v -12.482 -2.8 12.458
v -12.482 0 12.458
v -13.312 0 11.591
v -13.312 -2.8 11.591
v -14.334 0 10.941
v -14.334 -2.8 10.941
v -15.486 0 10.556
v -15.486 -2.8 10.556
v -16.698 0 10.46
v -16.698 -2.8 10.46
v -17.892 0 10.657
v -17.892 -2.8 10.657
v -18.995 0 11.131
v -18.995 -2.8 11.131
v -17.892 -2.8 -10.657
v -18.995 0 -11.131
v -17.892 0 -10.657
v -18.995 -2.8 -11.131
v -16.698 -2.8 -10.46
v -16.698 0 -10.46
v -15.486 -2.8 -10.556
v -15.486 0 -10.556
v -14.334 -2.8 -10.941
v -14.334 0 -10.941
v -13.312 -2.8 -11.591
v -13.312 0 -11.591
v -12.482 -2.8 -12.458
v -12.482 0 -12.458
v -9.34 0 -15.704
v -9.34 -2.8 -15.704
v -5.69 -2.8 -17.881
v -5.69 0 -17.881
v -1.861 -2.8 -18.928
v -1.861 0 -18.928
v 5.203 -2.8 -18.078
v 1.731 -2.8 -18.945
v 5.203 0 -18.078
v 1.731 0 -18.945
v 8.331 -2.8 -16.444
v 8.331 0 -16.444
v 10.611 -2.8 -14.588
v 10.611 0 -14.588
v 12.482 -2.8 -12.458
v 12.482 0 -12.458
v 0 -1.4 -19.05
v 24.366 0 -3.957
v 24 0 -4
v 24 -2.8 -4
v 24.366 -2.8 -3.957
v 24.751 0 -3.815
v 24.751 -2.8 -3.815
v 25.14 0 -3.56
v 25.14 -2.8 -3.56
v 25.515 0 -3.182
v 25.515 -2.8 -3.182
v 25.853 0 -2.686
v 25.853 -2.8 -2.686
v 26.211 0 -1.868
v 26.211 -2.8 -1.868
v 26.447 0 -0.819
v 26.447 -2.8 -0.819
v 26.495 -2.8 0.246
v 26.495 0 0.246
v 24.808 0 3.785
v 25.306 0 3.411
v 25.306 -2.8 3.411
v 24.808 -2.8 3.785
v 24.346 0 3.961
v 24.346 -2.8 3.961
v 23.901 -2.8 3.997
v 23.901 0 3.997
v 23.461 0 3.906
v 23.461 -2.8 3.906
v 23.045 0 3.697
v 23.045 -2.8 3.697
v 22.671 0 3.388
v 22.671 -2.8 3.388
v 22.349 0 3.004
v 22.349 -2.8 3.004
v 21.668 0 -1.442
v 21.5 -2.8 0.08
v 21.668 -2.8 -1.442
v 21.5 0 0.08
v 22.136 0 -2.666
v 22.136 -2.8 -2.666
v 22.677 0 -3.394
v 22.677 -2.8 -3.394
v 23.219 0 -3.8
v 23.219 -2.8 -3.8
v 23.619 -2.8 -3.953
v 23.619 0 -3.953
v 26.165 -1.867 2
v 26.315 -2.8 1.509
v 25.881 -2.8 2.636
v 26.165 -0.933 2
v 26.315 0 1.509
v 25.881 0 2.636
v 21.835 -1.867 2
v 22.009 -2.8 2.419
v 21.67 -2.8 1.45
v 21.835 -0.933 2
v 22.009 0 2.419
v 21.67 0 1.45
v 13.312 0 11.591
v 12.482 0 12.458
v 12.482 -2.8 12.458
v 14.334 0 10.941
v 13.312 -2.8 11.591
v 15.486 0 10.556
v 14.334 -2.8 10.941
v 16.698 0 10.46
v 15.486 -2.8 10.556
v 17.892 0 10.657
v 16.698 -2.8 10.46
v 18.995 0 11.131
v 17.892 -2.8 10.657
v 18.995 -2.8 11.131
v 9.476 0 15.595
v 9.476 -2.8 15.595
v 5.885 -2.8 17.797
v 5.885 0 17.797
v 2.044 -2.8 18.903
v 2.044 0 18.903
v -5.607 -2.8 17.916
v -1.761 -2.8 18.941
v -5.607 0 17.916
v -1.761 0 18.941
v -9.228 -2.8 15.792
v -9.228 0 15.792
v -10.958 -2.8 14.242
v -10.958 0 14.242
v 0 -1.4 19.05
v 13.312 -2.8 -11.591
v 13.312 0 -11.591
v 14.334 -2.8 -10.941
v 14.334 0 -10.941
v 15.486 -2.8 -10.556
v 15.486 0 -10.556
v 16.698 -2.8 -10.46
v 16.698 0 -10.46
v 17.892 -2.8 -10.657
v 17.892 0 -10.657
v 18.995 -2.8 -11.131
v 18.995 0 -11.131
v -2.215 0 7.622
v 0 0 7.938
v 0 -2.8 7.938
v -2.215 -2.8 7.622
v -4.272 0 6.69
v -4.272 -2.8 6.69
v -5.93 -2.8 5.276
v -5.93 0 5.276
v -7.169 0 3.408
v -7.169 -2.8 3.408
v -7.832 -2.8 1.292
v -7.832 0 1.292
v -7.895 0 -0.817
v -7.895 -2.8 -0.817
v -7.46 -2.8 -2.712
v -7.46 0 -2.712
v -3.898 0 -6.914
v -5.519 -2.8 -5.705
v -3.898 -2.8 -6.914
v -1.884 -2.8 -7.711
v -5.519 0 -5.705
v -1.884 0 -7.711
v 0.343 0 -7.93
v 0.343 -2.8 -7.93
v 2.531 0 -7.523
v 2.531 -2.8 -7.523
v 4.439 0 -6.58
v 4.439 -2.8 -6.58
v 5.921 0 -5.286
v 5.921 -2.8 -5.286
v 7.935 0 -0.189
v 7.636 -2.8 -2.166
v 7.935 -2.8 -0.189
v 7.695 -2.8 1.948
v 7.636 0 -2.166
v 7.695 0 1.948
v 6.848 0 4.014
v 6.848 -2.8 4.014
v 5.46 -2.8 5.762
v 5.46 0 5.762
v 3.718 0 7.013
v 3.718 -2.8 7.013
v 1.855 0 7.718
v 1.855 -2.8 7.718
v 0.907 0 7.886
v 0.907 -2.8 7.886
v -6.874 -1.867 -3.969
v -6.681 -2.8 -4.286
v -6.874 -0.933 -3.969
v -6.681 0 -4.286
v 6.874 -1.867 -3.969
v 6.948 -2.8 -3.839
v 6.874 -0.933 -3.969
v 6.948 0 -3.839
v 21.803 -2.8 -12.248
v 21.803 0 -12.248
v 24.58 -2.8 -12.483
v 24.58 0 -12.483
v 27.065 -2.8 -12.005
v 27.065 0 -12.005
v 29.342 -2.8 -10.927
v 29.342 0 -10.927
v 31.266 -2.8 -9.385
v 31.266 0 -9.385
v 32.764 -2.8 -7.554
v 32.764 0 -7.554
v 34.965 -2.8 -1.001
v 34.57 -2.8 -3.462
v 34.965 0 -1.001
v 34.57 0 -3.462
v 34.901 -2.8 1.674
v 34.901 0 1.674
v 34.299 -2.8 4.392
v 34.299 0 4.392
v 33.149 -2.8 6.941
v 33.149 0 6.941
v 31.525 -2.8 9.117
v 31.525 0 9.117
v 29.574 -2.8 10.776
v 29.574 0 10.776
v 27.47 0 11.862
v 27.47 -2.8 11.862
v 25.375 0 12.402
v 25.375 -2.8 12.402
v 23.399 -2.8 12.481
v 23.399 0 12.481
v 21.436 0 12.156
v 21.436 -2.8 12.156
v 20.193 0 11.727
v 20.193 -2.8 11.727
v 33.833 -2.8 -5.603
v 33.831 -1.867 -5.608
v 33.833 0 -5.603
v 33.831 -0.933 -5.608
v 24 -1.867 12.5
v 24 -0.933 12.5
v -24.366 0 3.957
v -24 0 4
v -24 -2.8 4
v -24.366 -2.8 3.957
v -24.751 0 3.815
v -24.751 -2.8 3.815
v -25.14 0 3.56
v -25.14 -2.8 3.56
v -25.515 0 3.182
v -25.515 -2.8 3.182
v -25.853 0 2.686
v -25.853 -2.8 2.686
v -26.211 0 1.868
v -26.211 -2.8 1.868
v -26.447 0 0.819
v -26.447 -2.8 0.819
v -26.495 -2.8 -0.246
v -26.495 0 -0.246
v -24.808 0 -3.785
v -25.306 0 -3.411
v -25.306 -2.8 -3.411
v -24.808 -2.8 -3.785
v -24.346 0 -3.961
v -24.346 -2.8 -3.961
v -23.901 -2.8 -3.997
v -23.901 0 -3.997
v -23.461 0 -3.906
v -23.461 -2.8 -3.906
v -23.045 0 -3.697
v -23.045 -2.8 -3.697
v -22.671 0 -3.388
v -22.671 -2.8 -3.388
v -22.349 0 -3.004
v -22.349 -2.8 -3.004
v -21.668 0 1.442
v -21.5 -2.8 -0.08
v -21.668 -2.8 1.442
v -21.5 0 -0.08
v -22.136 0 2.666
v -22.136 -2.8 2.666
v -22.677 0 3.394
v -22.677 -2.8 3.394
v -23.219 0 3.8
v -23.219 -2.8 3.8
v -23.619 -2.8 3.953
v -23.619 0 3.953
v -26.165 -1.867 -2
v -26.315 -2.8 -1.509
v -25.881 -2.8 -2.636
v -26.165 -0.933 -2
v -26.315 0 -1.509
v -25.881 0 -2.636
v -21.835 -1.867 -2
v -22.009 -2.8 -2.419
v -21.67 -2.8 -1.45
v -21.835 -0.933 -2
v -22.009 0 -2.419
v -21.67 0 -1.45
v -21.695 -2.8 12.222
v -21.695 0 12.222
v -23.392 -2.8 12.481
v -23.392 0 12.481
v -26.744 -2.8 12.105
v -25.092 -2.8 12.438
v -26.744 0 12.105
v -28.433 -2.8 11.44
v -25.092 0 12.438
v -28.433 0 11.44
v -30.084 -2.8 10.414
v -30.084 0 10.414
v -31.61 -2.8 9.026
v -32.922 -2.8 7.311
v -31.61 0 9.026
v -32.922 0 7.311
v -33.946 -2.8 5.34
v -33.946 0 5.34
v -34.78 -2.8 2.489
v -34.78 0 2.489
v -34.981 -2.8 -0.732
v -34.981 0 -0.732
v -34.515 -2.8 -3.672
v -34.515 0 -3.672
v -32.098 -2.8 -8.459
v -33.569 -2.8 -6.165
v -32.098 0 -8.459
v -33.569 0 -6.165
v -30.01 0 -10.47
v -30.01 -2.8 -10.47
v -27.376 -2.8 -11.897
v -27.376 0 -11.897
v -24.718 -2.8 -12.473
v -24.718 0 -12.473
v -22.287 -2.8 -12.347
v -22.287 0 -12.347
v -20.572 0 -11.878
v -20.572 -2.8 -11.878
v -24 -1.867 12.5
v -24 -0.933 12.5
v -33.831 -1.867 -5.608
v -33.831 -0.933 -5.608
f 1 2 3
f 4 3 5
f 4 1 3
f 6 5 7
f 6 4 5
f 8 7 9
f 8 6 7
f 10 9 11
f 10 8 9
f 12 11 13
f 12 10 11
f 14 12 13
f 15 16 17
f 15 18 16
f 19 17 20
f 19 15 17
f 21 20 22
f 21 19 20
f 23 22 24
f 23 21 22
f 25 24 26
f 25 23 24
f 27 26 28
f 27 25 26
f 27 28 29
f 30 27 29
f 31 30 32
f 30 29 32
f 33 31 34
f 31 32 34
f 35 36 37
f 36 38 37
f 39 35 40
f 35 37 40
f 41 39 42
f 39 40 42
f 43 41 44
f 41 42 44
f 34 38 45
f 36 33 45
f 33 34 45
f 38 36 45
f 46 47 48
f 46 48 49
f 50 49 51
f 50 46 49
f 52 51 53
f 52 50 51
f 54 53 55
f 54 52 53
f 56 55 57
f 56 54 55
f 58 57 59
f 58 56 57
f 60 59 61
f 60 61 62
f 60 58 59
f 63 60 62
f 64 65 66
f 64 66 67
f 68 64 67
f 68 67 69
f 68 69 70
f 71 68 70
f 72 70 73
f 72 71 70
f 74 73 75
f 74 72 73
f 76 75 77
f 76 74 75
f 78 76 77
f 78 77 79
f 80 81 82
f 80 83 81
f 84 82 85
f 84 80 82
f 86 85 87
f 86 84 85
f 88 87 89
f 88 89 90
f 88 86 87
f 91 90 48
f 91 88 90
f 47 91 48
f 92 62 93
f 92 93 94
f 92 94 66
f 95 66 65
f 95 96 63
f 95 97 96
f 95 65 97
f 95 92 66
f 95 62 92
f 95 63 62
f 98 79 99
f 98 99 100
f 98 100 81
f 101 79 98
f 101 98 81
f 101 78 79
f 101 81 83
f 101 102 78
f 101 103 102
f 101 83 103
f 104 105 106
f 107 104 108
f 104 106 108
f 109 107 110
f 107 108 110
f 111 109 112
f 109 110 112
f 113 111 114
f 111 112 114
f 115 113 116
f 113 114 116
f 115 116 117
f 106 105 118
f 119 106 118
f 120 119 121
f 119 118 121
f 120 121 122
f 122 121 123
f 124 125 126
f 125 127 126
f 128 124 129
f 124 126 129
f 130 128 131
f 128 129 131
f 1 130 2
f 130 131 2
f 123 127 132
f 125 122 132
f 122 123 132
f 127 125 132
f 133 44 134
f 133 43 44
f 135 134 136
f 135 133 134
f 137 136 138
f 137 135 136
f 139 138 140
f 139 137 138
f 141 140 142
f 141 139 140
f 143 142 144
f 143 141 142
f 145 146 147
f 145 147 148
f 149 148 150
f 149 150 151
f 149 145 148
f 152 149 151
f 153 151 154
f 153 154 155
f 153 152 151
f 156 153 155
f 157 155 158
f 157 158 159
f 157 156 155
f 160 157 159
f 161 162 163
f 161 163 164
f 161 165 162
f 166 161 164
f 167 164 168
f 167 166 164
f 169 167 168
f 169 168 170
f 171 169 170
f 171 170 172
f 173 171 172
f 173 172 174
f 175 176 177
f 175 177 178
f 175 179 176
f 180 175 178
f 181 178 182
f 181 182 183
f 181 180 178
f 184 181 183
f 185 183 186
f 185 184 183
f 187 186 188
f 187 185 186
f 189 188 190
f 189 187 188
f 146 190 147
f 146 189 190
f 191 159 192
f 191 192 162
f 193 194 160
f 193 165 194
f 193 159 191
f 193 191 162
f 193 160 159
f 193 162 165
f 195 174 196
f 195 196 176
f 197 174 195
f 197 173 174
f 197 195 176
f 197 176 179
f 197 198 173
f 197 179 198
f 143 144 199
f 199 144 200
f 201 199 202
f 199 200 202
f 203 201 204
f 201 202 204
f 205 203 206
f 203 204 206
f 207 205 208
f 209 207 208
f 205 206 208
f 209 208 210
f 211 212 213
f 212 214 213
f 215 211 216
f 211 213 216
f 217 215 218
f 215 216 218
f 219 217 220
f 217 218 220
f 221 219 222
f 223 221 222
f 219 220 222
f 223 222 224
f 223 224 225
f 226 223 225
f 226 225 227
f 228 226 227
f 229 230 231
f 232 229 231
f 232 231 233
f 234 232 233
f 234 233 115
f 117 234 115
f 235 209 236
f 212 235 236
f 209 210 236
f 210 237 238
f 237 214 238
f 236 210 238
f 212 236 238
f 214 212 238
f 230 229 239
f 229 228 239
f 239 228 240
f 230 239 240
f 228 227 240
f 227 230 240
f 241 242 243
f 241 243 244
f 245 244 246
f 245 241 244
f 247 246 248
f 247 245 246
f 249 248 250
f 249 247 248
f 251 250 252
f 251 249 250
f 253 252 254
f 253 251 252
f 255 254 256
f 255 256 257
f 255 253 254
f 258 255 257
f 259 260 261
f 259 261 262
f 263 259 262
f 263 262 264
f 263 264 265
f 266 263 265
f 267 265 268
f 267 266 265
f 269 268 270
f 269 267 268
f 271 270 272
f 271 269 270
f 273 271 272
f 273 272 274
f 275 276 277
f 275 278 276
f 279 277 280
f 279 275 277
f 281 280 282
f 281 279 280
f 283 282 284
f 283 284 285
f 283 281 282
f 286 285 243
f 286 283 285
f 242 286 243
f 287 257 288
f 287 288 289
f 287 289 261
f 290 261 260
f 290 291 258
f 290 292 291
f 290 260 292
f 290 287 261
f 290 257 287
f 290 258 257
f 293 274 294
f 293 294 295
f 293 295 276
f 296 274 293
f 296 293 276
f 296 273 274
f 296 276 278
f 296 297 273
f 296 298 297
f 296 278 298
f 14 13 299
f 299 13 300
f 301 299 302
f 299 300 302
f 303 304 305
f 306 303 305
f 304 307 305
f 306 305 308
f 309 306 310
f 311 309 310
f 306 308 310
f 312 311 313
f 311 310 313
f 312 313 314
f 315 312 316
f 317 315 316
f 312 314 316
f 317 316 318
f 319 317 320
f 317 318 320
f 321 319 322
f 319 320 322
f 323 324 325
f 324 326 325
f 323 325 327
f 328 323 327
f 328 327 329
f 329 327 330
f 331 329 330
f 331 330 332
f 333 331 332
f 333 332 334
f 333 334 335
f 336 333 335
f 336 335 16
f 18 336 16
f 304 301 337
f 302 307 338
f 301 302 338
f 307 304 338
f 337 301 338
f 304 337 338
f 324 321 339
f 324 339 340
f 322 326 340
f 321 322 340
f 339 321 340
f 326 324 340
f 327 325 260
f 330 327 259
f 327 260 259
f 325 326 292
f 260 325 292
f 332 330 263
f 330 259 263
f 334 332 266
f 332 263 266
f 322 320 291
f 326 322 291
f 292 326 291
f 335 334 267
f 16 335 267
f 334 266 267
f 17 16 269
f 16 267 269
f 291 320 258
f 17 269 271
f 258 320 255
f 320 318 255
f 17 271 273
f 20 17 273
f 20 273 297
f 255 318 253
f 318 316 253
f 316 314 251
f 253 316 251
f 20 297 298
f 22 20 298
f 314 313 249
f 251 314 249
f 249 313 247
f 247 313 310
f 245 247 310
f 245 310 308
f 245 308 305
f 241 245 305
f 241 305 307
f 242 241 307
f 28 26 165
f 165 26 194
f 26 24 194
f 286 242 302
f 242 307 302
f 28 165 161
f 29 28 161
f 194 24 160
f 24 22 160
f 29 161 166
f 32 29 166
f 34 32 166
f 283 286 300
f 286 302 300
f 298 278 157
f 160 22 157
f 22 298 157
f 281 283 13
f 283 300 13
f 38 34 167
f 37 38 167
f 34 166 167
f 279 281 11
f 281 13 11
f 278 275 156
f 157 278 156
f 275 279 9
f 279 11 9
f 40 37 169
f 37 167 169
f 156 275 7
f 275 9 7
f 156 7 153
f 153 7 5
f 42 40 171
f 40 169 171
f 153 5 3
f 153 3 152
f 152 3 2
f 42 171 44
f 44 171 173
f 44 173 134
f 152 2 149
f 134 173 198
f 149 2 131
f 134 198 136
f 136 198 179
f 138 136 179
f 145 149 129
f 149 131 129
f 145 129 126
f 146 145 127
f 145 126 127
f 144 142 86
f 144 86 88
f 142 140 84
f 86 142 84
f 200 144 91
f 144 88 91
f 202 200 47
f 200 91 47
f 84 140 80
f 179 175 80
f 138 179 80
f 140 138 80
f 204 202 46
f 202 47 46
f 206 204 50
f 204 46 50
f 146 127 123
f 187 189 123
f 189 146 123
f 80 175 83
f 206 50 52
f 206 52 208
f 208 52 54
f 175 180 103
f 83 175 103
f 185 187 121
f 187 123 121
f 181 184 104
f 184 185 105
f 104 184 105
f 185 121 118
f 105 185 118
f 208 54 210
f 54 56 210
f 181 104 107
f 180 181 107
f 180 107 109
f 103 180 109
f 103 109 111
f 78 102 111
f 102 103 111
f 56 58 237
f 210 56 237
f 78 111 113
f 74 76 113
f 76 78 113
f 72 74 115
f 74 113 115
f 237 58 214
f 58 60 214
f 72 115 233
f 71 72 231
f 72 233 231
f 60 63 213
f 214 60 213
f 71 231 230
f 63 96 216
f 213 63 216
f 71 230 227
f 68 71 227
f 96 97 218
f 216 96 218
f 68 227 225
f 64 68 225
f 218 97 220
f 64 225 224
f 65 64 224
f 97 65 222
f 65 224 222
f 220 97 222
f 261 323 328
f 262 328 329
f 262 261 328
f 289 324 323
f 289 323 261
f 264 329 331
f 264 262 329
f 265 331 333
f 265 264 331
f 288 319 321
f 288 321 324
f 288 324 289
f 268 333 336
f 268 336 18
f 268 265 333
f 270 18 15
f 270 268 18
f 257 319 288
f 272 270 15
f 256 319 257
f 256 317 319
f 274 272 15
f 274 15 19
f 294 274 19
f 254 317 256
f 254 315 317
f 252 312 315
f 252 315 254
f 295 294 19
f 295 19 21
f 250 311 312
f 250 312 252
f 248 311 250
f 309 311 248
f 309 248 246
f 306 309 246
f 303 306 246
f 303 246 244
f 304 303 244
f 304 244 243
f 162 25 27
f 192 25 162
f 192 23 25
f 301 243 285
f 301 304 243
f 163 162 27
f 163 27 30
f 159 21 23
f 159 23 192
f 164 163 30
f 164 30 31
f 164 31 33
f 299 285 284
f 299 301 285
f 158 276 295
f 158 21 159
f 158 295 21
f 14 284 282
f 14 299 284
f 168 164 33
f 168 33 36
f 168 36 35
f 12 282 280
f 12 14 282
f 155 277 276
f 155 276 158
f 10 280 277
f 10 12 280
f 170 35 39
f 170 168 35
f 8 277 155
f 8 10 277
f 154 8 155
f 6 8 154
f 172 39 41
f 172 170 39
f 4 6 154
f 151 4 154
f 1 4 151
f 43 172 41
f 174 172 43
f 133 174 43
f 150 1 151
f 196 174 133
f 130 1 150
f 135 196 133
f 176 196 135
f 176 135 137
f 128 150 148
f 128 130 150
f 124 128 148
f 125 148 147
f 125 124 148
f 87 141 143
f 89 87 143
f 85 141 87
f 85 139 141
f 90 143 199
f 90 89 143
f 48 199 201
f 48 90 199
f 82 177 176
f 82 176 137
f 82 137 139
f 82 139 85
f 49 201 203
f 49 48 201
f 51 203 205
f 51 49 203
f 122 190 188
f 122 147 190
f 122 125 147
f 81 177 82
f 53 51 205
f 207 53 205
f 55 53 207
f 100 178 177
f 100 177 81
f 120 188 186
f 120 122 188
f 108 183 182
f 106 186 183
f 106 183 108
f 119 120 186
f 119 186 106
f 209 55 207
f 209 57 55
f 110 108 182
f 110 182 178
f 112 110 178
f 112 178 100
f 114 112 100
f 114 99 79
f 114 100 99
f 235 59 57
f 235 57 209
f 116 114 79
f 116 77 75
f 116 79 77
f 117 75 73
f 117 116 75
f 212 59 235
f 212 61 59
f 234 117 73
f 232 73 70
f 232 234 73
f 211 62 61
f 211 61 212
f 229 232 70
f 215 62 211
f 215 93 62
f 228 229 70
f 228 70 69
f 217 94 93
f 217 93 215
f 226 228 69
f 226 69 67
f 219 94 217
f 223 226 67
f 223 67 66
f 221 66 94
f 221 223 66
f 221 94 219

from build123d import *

# Parameters (mm, degrees)
F1_DEPTH = 2.8
F2_R     = 5


with BuildPart() as f1:
    # F0 (on Front) → F1 (new body)
    with BuildSketch(Plane.XZ):
        with BuildLine():
            add(Edge.make_bspline(
                [(15.1791602264, 7.4683202907), (10.9042729382, 19.05), (0, 19.05)],
                knots=[5.1152346644, 5.1152346644, 5.1152346644, 6.2831853072, 6.2831853072, 6.2831853072], degree=2, weights=[1, 0.834277475, 1]))
            add(Edge.make_bspline(
                [(0, 19.05), (-10.9042729382, 19.05), (-15.1791602264, 7.4683202907)],
                knots=[0, 0, 0, 1.1679506428, 1.1679506428, 1.1679506428], degree=2, weights=[1, 0.834277475, 1]))
            add(Edge.make_bspline(
                [(-15.1791602264, -7.4683202907), (-10.2824852162, 0), (-15.1791602264, 7.4683202907)],
                knots=[4.0720520932, 4.0720520932, 4.0720520932, 5.3527258676, 5.3527258676, 5.3527258676], degree=2, weights=[1, 0.8018945249, 1]))
            add(Edge.make_bspline(
                [(-15.1791602264, -7.4683202907), (0, -48.5922517878), (15.1791602264, -7.4683202907)],
                knots=[1.9736420108, 1.9736420108, 1.9736420108, 4.3095432964, 4.3095432964, 4.3095432964], degree=2, weights=[1, 0.3920378105, 1]))
            add(Edge.make_bspline(
                [(15.1791602264, 7.4683202907), (10.2824852162, 0), (15.1791602264, -7.4683202907)],
                knots=[0.9304594396, 0.9304594396, 0.9304594396, 2.211133214, 2.211133214, 2.211133214], degree=2, weights=[1, 0.8018945249, 1]))
        make_face()
        with BuildLine():
            add(Edge.make_bspline(
                [(0, 7.9375), (-13.7481532851, 7.9375), (-6.8740766425, -3.96875), (0, -15.875), (6.8740766425, -3.96875), (13.7481532851, 7.9375), (0, 7.9375)],
                knots=[0, 0, 0, 2.0943951024, 2.0943951024, 4.1887902048, 4.1887902048, 6.2831853072, 6.2831853072, 6.2831853072], degree=2, weights=[1, 0.5, 1, 0.5, 1, 0.5, 1]))
        make_face(mode=Mode.SUBTRACT)
        with BuildLine():
            add(Edge.make_bspline(
                [(-15.1791602264, -7.4683202907), (-10.2824852162, 0), (-15.1791602264, 7.4683202907)],
                knots=[4.0720520932, 4.0720520932, 4.0720520932, 5.3527258676, 5.3527258676, 5.3527258676], degree=2, weights=[1, 0.8018945249, 1]))
            add(Edge.make_bspline(
                [(-15.1791602264, 7.4683202907), (-17.9357748347, 0), (-15.1791602264, -7.4683202907)],
                knots=[1.1679506428, 1.1679506428, 1.1679506428, 1.9736420108, 1.9736420108, 1.9736420108], degree=2, weights=[1, 0.9199491046, 1]))
        make_face()
        with BuildLine():
            add(Edge.make_bspline(
                [(-15.1791602264, 7.4683202907), (-17.9357748347, 0), (-15.1791602264, -7.4683202907)],
                knots=[1.1679506428, 1.1679506428, 1.1679506428, 1.9736420108, 1.9736420108, 1.9736420108], degree=2, weights=[1, 0.9199491046, 1]))
            add(Edge.make_bspline(
                [(-15.1791602264, 7.4683202907), (-18.4782287361, 12.5), (-24, 12.5)],
                knots=[5.3527258676, 5.3527258676, 5.3527258676, 6.2831853072, 6.2831853072, 6.2831853072], degree=2, weights=[1, 0.8937185304, 1]))
            add(Edge.make_bspline(
                [(-24, 12.5), (-41.8298969495, 12.5), (-33.8309038347, -5.6078514765), (-25.83191072, -23.7157029531), (-15.1791602264, -7.4683202907)],
                knots=[0, 0, 0, 2.0360260466, 2.0360260466, 4.0720520932, 4.0720520932, 4.0720520932], degree=2, weights=[1, 0.5250580358, 1, 0.5250580358, 1]))
        make_face()
        with BuildLine():
            add(Edge.make_bspline(
                [(-24, 4), (-28.3301270189, 4), (-26.1650635095, -2), (-24, -8), (-21.8349364905, -2), (-19.6698729811, 4), (-24, 4)],
                knots=[0, 0, 0, 2.0943951024, 2.0943951024, 4.1887902048, 4.1887902048, 6.2831853072, 6.2831853072, 6.2831853072], degree=2, weights=[1, 0.5, 1, 0.5, 1, 0.5, 1]))
        make_face(mode=Mode.SUBTRACT)
        with BuildLine():
            add(Edge.make_bspline(
                [(24, 12.5), (18.4782287361, 12.5), (15.1791602264, 7.4683202907)],
                knots=[0, 0, 0, 0.9304594396, 0.9304594396, 0.9304594396], degree=2, weights=[1, 0.8937185304, 1]))
            add(Edge.make_bspline(
                [(15.1791602264, -7.4683202907), (17.9357748347, 0), (15.1791602264, 7.4683202907)],
                knots=[4.3095432964, 4.3095432964, 4.3095432964, 5.1152346644, 5.1152346644, 5.1152346644], degree=2, weights=[1, 0.9199491046, 1]))
            add(Edge.make_bspline(
                [(15.1791602264, -7.4683202907), (25.83191072, -23.7157029531), (33.8309038347, -5.6078514765), (41.8298969495, 12.5), (24, 12.5)],
                knots=[2.211133214, 2.211133214, 2.211133214, 4.2471592606, 4.2471592606, 6.2831853072, 6.2831853072, 6.2831853072], degree=2, weights=[1, 0.5250580358, 1, 0.5250580358, 1]))
        make_face()
        with BuildLine():
            add(Edge.make_bspline(
                [(24, -4), (28.3301270189, -4), (26.1650635095, 2), (24, 8), (21.8349364905, 2), (19.6698729811, -4), (24, -4)],
                knots=[0, 0, 0, 2.0943951024, 2.0943951024, 4.1887902048, 4.1887902048, 6.2831853072, 6.2831853072, 6.2831853072], degree=2, weights=[1, 0.5, 1, 0.5, 1, 0.5, 1]))
        make_face(mode=Mode.SUBTRACT)
        with BuildLine():
            add(Edge.make_bspline(
                [(15.1791602264, -7.4683202907), (17.9357748347, 0), (15.1791602264, 7.4683202907)],
                knots=[4.3095432964, 4.3095432964, 4.3095432964, 5.1152346644, 5.1152346644, 5.1152346644], degree=2, weights=[1, 0.9199491046, 1]))
            add(Edge.make_bspline(
                [(15.1791602264, 7.4683202907), (10.2824852162, 0), (15.1791602264, -7.4683202907)],
                knots=[0.9304594396, 0.9304594396, 0.9304594396, 2.211133214, 2.211133214, 2.211133214], degree=2, weights=[1, 0.8018945249, 1]))
        make_face()
    extrude(amount=F1_DEPTH)

    # F2
    f2_edges = [f1.edges().sort_by_distance(p)[0] for p in [
        (15.17916, -1.4, -7.46832),
        (-15.17916, -1.4, 7.46832),
        (-15.17916, -1.4, -7.46832),
        (15.17916, -1.4, 7.46832),
    ]]
    fillet(f2_edges, radius=F2_R)


solid = f1.part
